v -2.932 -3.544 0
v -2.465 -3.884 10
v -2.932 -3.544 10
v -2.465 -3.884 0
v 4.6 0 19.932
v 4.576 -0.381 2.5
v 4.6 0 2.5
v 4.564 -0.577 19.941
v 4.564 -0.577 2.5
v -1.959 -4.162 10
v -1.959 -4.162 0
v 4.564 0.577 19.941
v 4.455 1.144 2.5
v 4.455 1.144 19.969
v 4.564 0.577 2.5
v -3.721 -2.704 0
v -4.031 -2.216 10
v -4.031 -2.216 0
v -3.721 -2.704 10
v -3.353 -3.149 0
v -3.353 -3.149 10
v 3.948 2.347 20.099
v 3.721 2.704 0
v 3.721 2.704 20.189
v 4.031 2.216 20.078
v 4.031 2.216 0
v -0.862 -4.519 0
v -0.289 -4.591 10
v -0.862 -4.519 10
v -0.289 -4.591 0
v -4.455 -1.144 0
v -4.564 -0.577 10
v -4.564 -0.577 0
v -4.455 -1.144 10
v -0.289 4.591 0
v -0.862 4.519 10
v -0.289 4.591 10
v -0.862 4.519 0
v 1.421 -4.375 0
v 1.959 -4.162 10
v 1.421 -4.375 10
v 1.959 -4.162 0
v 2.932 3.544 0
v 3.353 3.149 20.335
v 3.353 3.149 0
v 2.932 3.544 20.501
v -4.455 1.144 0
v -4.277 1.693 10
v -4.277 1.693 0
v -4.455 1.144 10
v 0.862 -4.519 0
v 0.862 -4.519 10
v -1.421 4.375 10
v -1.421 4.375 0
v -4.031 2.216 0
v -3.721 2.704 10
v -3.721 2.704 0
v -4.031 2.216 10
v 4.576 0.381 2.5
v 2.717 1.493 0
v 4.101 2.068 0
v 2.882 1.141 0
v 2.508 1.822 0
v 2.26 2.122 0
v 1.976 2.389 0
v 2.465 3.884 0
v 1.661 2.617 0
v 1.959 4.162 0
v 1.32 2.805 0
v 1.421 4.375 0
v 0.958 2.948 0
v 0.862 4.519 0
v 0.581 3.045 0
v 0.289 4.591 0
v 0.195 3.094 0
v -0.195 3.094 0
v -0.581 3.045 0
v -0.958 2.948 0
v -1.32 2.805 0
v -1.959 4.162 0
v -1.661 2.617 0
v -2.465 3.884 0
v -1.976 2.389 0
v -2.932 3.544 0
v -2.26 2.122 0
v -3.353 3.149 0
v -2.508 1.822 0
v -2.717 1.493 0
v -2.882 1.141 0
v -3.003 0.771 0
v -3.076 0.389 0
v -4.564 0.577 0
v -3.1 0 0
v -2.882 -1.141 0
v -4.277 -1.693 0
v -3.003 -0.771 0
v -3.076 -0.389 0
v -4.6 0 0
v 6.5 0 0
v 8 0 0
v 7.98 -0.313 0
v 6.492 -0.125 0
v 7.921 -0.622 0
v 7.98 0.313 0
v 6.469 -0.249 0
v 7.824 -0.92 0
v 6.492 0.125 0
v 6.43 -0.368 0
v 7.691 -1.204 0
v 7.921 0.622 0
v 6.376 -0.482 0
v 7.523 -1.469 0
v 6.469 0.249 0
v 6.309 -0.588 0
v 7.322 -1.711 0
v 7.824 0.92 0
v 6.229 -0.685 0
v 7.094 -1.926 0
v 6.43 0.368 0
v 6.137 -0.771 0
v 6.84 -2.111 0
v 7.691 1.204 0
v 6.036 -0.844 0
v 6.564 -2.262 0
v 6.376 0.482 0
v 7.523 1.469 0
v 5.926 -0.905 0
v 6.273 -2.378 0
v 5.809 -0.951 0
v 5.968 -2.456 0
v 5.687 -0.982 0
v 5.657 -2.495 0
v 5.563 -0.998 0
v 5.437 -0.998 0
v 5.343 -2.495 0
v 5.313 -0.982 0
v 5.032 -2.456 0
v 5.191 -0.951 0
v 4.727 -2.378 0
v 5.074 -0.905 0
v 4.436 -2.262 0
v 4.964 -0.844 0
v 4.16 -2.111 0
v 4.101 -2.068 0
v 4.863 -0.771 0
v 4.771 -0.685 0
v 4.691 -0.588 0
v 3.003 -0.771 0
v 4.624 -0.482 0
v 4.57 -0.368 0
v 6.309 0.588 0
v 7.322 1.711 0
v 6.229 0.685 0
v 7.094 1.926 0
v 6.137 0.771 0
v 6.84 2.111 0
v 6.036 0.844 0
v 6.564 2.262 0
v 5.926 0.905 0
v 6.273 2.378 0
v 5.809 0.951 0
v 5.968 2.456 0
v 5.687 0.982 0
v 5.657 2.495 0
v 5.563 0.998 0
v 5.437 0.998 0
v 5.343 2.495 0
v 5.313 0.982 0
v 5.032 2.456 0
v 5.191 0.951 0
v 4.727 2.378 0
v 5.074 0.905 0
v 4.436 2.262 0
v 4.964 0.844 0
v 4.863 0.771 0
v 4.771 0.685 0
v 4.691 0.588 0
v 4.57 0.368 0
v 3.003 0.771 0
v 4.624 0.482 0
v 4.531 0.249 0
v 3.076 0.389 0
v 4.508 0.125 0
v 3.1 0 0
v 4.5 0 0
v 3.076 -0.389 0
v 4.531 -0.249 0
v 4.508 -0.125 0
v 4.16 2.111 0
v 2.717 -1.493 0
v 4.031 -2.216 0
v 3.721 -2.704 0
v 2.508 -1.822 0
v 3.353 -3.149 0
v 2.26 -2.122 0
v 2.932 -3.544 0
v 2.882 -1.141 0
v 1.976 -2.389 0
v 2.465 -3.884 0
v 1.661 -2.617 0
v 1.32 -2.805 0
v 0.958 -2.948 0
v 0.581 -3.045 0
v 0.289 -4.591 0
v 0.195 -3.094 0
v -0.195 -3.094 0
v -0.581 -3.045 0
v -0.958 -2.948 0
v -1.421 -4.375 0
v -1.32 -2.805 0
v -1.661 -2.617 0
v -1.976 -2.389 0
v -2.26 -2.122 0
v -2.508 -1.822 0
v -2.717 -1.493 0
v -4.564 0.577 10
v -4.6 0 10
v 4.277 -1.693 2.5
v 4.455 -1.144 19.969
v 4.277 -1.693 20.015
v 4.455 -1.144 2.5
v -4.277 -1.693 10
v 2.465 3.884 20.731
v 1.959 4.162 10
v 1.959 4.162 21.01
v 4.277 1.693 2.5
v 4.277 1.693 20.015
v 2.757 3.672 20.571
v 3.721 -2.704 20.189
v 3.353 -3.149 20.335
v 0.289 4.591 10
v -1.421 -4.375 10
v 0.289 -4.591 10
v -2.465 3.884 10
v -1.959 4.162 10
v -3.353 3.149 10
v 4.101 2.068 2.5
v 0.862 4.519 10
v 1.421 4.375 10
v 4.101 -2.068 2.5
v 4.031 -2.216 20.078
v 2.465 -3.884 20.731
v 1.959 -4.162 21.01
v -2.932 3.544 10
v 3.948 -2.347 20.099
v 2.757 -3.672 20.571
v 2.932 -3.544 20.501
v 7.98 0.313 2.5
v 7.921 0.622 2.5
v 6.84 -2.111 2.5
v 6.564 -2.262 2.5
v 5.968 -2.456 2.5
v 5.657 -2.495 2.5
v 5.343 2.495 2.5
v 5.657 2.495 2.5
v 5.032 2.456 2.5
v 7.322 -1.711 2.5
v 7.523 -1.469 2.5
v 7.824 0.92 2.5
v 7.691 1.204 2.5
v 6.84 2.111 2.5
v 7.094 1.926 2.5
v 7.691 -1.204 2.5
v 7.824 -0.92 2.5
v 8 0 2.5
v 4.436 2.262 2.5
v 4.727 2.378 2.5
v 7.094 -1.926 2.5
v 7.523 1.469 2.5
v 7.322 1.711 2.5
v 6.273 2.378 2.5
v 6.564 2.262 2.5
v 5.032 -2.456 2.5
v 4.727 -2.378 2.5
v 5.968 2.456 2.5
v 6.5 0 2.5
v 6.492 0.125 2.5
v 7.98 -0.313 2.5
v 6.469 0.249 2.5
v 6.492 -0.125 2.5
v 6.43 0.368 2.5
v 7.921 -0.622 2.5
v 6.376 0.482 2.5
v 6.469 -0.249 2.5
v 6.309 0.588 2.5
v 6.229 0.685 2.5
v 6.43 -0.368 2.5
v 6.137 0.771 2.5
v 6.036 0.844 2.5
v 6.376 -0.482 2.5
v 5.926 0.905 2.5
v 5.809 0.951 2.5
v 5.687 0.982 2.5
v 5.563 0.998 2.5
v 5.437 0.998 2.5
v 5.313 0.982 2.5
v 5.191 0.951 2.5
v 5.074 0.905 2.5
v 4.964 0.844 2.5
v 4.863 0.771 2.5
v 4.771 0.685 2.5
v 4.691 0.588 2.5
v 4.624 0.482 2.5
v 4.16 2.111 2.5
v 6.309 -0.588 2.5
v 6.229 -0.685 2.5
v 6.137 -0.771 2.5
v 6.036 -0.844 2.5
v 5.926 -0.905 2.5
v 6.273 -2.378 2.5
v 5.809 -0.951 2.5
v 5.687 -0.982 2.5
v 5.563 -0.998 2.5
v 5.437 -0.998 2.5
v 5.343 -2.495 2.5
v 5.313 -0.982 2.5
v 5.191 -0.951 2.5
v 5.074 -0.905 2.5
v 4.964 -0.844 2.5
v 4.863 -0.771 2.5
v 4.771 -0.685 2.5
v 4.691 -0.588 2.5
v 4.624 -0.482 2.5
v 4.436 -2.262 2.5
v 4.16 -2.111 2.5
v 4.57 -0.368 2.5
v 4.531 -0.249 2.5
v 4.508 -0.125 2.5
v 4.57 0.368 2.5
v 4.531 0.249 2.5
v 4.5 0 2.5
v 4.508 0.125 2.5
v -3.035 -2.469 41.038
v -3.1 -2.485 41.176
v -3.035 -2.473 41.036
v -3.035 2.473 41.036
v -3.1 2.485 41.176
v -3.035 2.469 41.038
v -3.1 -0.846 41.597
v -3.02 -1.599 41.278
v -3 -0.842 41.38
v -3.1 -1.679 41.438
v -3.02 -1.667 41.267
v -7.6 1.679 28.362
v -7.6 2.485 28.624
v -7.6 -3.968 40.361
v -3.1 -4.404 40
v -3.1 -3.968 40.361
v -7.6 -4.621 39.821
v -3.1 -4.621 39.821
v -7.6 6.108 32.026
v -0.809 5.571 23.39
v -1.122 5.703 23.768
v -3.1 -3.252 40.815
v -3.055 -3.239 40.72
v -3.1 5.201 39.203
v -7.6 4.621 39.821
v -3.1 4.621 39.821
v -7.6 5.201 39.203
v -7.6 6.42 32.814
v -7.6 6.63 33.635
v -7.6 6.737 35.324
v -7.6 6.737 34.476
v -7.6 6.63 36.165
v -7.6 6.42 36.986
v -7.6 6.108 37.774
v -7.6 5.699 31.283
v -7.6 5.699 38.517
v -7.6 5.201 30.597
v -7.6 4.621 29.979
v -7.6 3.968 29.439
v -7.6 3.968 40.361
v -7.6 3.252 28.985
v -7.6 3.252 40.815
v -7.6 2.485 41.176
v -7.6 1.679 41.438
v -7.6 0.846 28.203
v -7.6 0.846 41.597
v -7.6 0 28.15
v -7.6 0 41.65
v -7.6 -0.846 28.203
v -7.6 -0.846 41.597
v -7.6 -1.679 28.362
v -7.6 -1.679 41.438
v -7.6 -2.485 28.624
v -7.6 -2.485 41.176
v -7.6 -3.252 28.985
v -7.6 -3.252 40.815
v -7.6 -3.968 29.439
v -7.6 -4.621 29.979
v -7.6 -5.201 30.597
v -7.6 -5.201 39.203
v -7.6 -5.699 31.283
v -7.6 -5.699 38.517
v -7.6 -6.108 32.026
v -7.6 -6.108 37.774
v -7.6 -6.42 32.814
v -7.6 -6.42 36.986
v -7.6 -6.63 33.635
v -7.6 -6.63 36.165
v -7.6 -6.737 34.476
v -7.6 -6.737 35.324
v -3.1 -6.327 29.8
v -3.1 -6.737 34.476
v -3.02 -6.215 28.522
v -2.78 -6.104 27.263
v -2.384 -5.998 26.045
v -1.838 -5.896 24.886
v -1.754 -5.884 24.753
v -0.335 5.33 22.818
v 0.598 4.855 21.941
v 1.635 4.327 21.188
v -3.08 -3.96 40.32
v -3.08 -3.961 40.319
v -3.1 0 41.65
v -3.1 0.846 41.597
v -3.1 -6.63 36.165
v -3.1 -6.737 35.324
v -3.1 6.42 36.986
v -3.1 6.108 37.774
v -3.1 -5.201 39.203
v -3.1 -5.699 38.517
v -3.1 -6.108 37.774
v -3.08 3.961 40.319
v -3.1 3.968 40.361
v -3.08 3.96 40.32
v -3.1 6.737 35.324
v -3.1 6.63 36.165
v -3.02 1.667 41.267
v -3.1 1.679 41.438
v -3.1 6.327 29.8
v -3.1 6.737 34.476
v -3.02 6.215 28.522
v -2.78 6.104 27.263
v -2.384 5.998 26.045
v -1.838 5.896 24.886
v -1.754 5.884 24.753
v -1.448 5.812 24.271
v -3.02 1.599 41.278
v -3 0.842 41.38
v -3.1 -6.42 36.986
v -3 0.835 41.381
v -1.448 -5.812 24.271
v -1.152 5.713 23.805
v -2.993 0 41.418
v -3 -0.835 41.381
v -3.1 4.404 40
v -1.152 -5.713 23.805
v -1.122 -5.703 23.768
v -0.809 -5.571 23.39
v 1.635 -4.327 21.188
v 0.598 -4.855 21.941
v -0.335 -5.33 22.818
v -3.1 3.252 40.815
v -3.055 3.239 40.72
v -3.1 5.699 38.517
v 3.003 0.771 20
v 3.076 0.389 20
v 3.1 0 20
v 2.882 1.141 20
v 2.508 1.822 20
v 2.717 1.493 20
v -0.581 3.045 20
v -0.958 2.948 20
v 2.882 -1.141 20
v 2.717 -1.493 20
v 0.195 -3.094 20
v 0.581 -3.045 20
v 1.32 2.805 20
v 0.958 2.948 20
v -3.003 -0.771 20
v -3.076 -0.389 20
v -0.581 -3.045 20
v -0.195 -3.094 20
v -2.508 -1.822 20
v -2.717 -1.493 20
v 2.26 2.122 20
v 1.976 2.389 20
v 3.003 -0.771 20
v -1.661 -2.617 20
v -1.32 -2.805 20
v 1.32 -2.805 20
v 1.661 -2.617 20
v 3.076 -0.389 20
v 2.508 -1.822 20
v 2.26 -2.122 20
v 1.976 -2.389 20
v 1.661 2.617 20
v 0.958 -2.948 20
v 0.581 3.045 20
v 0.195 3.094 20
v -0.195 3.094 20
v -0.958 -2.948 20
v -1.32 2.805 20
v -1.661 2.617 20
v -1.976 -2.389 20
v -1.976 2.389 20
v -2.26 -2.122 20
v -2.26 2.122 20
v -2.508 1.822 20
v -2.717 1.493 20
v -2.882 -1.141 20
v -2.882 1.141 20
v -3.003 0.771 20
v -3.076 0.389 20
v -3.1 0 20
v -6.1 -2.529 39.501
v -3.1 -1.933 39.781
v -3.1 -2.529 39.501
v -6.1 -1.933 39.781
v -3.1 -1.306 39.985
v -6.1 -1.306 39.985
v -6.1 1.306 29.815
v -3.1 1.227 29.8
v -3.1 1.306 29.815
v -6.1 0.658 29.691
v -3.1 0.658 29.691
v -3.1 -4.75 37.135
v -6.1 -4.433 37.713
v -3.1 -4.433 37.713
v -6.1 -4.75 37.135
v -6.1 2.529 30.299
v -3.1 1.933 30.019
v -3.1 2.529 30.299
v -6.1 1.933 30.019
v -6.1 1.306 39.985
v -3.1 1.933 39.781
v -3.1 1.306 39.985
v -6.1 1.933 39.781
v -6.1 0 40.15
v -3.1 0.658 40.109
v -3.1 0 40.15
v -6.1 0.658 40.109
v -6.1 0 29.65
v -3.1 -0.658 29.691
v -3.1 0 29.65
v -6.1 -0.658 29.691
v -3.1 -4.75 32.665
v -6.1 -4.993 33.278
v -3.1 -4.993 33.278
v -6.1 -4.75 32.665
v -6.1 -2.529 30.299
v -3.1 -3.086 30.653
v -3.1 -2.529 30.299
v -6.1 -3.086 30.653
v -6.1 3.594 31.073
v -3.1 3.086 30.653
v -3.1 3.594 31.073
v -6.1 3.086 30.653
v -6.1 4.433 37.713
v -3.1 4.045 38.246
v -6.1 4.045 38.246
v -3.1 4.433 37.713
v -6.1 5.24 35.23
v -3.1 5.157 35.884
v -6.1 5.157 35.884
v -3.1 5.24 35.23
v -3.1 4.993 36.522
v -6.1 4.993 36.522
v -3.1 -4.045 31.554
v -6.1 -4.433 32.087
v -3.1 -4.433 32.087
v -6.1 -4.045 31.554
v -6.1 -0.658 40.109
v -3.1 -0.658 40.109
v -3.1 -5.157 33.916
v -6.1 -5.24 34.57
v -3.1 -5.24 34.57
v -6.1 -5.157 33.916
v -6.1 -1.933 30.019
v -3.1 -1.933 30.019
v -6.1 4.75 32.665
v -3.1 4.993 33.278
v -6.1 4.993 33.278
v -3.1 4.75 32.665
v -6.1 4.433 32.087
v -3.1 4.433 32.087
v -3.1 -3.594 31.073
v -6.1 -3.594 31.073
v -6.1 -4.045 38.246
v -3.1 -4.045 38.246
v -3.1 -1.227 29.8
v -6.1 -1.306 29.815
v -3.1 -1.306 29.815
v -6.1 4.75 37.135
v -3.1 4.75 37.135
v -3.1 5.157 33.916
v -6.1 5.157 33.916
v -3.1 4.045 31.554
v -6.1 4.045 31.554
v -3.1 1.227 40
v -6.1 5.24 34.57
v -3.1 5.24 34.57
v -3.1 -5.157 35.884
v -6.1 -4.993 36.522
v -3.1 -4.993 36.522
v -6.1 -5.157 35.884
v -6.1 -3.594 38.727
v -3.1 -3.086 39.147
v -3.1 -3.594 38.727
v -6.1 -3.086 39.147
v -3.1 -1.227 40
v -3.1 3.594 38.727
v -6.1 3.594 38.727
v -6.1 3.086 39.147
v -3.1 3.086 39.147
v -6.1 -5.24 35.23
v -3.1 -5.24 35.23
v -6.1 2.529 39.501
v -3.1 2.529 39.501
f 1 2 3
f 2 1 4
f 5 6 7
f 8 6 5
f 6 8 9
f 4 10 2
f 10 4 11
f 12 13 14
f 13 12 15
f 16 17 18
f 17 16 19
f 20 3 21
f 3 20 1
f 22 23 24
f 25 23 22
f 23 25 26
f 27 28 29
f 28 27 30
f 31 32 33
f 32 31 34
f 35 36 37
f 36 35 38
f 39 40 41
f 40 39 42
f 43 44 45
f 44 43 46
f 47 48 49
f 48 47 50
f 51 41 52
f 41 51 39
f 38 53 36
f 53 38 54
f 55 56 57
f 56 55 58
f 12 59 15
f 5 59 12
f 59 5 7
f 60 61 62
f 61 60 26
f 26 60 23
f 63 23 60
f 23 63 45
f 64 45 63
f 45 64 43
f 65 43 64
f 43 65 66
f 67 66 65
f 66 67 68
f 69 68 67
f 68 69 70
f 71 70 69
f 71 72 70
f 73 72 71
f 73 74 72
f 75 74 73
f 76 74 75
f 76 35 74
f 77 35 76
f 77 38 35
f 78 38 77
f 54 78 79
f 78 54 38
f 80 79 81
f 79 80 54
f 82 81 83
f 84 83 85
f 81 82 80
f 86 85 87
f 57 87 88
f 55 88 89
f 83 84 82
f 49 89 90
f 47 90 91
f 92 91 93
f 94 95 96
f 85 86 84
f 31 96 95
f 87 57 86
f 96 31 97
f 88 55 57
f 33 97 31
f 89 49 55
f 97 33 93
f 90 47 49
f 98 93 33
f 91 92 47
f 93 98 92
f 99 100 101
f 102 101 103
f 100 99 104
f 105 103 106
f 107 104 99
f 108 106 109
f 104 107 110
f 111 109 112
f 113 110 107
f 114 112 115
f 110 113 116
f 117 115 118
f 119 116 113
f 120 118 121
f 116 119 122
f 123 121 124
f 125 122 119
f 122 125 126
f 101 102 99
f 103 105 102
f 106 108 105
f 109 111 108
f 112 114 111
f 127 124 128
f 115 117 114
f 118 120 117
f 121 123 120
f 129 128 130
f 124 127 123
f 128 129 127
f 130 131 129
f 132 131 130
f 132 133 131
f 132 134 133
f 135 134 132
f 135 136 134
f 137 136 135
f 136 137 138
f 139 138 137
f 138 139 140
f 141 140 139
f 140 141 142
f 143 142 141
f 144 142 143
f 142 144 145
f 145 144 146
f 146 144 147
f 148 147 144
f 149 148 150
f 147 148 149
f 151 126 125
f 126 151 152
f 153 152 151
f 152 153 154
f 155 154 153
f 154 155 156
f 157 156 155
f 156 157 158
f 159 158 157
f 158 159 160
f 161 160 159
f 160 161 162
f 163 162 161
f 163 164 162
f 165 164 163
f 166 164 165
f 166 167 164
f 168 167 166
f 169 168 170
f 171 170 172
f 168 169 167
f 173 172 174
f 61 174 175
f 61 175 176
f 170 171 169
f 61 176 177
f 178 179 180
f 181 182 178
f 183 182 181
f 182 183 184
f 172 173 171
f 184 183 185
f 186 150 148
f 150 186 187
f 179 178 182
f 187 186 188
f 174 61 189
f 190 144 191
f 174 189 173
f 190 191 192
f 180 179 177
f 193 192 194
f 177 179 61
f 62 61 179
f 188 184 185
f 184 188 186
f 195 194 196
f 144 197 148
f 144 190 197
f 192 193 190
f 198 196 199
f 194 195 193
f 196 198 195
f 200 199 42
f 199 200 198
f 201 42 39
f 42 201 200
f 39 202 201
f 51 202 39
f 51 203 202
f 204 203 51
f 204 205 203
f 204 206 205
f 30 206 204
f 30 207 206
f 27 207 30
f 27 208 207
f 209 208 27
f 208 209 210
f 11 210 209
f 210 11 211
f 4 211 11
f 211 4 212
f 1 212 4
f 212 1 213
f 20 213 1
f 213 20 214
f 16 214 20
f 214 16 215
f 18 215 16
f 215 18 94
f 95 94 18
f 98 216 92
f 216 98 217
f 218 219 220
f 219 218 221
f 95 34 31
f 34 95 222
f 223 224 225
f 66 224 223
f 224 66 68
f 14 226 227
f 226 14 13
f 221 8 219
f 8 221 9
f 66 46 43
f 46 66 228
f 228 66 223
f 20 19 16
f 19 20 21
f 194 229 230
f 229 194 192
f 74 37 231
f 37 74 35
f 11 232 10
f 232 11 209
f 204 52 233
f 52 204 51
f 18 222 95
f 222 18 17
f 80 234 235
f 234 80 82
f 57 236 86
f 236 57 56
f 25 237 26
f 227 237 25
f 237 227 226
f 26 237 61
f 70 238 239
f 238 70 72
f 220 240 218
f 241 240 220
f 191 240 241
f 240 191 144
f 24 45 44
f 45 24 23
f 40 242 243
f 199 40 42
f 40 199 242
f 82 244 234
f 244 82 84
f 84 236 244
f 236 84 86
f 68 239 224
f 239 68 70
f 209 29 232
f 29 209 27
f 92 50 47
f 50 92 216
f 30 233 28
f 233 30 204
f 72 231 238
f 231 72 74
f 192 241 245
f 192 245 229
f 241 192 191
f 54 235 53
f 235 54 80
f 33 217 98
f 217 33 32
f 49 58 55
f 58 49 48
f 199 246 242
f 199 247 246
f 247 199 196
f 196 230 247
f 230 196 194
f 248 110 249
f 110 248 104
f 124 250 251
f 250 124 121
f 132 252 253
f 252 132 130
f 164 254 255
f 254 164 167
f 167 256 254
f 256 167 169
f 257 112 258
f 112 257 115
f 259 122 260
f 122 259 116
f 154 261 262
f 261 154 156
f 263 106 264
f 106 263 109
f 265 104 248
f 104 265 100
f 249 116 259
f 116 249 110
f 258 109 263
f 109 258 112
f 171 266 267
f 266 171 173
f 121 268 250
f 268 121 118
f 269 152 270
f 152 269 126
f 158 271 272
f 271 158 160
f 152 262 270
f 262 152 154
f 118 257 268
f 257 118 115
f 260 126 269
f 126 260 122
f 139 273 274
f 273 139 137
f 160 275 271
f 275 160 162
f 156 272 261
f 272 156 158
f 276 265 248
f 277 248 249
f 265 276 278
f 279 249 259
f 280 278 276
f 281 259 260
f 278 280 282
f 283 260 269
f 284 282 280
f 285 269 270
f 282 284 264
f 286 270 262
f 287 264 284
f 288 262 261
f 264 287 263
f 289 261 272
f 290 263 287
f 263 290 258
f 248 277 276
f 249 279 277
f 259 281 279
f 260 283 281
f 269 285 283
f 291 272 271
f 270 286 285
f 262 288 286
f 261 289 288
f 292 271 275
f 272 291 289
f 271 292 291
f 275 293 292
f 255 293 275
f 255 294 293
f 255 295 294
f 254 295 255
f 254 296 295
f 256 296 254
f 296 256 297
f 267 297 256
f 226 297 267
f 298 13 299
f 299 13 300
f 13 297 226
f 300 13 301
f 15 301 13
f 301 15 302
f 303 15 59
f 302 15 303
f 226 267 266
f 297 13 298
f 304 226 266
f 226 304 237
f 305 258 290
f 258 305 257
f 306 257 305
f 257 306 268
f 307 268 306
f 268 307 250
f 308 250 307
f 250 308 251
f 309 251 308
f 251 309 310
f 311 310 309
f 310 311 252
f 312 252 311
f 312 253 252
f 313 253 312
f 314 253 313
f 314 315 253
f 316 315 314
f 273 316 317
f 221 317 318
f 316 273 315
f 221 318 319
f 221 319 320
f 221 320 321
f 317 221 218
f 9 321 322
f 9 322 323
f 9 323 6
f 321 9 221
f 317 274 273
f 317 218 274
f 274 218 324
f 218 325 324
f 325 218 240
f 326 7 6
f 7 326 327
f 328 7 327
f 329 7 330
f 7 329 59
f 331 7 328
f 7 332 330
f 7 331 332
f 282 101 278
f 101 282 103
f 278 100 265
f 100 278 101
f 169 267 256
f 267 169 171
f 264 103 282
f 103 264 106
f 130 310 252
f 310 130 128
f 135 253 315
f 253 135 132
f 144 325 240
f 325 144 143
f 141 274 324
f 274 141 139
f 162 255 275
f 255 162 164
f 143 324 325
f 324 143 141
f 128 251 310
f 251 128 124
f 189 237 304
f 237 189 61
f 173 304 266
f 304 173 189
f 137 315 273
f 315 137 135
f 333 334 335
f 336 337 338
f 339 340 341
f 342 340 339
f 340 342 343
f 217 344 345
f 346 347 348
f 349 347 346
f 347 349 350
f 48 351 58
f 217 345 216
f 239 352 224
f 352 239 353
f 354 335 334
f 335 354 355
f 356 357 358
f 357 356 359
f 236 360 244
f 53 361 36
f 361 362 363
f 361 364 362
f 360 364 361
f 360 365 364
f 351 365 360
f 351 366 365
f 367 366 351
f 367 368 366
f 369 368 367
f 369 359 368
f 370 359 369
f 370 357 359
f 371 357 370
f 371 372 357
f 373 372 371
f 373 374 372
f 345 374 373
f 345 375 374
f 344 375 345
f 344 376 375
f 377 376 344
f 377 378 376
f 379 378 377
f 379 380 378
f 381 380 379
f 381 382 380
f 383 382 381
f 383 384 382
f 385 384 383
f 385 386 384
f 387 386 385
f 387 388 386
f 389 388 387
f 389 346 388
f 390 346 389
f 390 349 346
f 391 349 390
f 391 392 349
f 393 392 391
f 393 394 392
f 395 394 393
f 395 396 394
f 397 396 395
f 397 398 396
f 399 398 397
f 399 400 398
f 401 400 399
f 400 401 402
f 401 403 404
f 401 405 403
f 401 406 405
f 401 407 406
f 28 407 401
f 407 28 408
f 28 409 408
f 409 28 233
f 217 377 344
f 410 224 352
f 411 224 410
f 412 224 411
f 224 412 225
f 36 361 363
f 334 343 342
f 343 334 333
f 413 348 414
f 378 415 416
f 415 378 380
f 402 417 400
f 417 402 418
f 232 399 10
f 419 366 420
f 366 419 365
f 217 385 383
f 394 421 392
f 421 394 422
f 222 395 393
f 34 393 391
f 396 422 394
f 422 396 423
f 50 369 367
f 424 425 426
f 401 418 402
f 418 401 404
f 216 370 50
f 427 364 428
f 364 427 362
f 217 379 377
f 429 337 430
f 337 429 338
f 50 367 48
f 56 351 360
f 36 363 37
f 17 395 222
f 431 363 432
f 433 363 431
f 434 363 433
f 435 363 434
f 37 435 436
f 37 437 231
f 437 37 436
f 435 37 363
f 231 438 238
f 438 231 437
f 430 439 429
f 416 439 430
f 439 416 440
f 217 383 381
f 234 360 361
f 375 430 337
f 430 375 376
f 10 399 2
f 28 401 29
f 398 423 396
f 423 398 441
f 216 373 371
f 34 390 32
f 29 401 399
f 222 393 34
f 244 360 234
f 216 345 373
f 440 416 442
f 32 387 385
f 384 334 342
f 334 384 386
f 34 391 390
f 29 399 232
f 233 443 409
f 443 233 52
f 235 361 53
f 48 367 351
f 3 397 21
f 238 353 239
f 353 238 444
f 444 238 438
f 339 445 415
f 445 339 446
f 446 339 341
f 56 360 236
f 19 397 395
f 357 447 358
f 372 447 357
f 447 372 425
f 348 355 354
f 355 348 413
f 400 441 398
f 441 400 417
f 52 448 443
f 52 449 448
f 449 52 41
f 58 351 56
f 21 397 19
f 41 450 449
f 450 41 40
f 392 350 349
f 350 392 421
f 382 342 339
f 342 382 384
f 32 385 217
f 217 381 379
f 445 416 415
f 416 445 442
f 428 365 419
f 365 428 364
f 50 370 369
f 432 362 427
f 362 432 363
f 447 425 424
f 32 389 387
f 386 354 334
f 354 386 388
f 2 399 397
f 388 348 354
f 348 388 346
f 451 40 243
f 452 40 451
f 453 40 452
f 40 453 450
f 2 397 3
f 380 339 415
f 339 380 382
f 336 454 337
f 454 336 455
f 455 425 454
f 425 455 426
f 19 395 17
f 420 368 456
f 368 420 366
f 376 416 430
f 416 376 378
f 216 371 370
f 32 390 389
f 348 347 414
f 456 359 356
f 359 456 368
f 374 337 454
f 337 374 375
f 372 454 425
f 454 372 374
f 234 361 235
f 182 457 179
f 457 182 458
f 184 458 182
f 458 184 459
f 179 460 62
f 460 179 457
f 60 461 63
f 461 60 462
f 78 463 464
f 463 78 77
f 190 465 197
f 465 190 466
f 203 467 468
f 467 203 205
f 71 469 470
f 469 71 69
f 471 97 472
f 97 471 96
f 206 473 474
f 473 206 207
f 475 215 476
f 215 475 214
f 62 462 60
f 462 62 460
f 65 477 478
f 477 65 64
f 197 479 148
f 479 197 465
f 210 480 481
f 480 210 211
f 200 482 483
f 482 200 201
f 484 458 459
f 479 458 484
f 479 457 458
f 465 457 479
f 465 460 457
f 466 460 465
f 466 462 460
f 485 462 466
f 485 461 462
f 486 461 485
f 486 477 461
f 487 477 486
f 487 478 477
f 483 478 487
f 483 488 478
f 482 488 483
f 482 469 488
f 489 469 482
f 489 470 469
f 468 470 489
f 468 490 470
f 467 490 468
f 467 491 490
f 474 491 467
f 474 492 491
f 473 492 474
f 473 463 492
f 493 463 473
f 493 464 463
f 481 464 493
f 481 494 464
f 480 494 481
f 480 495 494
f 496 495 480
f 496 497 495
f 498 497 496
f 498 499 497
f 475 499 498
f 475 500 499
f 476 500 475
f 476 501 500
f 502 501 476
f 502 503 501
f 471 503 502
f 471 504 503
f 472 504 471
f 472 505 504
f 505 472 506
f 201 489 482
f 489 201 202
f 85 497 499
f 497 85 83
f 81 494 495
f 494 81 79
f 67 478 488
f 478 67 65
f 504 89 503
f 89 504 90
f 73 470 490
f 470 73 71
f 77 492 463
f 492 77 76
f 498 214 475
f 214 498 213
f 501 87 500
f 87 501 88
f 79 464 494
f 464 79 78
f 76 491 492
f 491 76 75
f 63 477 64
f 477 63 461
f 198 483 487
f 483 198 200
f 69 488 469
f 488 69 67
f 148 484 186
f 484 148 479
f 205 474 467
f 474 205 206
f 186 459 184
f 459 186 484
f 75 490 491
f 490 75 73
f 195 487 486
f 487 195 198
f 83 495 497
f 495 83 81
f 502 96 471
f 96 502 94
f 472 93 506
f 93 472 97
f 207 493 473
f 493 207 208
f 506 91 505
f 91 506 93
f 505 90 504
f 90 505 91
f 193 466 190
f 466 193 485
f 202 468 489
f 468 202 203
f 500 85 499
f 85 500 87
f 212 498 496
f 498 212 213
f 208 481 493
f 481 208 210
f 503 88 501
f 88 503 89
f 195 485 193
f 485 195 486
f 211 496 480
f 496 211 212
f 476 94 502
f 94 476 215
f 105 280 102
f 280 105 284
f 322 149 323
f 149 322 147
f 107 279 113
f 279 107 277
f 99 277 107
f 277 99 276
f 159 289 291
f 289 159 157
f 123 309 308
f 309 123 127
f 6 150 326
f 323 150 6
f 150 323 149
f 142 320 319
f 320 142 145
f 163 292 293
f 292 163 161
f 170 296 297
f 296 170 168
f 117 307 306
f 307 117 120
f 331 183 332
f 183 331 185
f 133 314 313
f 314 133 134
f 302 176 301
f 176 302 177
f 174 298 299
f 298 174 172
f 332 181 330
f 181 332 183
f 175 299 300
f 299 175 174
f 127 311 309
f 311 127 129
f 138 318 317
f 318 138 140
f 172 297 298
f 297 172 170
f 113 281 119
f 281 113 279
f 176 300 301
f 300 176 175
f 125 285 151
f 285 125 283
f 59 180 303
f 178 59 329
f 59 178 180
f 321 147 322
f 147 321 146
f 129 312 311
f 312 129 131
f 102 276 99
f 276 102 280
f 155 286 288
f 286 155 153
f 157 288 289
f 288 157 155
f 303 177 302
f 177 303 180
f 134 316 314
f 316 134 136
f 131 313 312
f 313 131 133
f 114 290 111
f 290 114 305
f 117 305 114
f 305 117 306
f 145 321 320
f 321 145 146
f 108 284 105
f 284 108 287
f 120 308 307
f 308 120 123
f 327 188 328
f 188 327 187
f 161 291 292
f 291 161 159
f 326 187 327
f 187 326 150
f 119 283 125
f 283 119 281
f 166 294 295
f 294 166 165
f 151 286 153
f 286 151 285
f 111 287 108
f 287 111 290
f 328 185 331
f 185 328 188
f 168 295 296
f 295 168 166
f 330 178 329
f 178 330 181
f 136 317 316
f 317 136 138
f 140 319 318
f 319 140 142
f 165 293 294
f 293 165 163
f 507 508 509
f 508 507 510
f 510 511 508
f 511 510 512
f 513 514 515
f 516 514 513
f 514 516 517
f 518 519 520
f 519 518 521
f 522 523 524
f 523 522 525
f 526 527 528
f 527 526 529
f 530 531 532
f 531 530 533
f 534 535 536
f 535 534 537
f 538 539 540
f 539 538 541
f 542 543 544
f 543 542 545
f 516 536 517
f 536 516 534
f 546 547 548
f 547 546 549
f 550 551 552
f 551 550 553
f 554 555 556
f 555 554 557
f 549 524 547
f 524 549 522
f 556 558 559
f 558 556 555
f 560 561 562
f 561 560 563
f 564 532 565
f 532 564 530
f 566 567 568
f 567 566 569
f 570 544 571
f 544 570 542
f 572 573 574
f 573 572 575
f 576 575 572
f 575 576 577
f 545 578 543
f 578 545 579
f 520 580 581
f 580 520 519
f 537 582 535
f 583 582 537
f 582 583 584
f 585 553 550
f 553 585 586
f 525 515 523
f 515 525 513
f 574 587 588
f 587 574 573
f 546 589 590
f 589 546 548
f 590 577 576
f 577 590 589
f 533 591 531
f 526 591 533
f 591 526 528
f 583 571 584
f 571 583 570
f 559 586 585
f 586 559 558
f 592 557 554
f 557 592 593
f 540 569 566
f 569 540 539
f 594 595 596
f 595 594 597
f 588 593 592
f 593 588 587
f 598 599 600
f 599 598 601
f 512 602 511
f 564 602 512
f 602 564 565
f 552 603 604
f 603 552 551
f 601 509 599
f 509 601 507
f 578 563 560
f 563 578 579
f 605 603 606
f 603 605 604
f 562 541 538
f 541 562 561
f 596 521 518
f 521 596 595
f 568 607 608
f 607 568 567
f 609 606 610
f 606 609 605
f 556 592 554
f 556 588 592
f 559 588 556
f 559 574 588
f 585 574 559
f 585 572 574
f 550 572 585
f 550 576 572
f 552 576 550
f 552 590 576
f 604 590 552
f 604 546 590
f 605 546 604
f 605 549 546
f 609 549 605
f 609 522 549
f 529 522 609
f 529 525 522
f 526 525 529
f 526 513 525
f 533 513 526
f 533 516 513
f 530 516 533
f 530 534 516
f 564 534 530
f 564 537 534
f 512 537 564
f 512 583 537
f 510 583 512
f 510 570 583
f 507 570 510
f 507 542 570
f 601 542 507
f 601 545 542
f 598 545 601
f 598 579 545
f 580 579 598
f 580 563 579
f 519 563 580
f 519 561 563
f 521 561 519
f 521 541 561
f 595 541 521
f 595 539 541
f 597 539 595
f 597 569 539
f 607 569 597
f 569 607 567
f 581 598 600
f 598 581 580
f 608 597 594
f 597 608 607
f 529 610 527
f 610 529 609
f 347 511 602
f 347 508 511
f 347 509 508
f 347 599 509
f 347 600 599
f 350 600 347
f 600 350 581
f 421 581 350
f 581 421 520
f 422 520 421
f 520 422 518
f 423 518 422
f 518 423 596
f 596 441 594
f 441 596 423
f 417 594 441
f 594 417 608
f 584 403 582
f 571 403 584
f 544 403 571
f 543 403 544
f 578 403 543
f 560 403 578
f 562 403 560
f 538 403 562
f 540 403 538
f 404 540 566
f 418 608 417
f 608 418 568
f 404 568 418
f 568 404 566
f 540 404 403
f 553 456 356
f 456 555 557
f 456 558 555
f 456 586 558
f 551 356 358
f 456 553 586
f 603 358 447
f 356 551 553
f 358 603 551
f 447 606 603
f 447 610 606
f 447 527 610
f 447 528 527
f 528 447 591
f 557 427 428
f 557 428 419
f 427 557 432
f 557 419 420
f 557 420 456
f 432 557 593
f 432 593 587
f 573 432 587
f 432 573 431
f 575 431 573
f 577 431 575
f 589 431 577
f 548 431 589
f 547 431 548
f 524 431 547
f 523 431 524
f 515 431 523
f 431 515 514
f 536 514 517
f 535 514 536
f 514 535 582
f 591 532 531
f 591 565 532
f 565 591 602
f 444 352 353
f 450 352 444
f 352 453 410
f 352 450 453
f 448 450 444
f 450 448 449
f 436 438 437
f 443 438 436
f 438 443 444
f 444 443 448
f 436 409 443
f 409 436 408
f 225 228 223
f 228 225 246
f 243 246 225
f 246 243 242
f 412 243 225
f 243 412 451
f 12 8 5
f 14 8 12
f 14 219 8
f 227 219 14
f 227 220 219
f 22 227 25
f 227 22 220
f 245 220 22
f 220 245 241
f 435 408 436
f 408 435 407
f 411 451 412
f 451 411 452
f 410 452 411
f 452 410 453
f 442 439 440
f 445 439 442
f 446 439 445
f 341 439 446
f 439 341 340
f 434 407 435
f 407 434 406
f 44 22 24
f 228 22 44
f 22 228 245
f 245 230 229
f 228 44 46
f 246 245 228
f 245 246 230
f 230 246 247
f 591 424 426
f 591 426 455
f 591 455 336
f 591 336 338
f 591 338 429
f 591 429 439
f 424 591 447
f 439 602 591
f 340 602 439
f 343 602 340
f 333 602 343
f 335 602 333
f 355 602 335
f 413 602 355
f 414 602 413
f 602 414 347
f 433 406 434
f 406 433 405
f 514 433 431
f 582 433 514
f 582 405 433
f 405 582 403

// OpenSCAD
ROD_DIA = 6.2;
ROD_SIDE_LENGTH = 25;
ROD_SIDE_OFFSET = 10;
ROD_DEPTH = 20;

BALL_DIA = 10.2;
BALL_SIDE_LENGTH = 15;
BALL_SIDE_OFFSET = BALL_DIA/2 + 2;

MAGNET_DIA = 10.5;
MAGNET_THICKNESS = 3;
MAGNET_OFFSET = -BALL_DIA/2 - 1;

SPRING_HOLE = true;
SPRING_HOLE_DIA = 2;
SPRING_HOLE_THICKNESS = 2.5;
SPRING_HOLE_OFFSET = 5.5;

WALL_THICKNESS = 1.5;

$fn = 50;

difference() {
  union() {
    cylinder(d = ROD_DIA + 2 * WALL_THICKNESS, h = ROD_SIDE_LENGTH);

    if(SPRING_HOLE) {
      translate([SPRING_HOLE_OFFSET, 0, 0])
      cylinder(d = SPRING_HOLE_DIA + 2 * WALL_THICKNESS, h = SPRING_HOLE_THICKNESS);
    }

    hull() {
      translate([0, 0, ROD_SIDE_OFFSET])
      cylinder(d = ROD_DIA + 2 * WALL_THICKNESS, h = ROD_SIDE_LENGTH - ROD_SIDE_OFFSET);

      translate([MAGNET_OFFSET - WALL_THICKNESS, 0, ROD_SIDE_LENGTH + BALL_SIDE_LENGTH - BALL_DIA/2])
      rotate([0, 90, 0])
      cylinder(d = MAGNET_DIA + 2 * WALL_THICKNESS, h = MAGNET_THICKNESS + WALL_THICKNESS);
    }
  }

  #cylinder(d = ROD_DIA, h = ROD_DEPTH);

  if(SPRING_HOLE) {
    #translate([SPRING_HOLE_OFFSET, 0, 0])
    cylinder(d = SPRING_HOLE_DIA, h = SPRING_HOLE_THICKNESS);
  }

  #translate([0, 0, ROD_SIDE_LENGTH + BALL_SIDE_LENGTH - BALL_DIA/2])
  sphere(d = BALL_DIA);

  #translate([MAGNET_OFFSET, 0, ROD_SIDE_LENGTH + BALL_SIDE_LENGTH - BALL_DIA/2])
  rotate([0, 90, 0])
  cylinder(d = MAGNET_DIA, h = MAGNET_THICKNESS);

  #hull() {
    translate([BALL_SIDE_OFFSET, 0, ROD_SIDE_LENGTH + BALL_SIDE_LENGTH - BALL_DIA])
    rotate([90, 0, 0])
    cylinder(d = BALL_DIA * 2, h = BALL_DIA * 2, center = true);

    translate([BALL_SIDE_OFFSET, 0, ROD_SIDE_LENGTH + BALL_SIDE_LENGTH])
    rotate([90, 0, 0])
    cylinder(d = BALL_DIA * 2, h = BALL_DIA * 2, center = true);
  }
}
